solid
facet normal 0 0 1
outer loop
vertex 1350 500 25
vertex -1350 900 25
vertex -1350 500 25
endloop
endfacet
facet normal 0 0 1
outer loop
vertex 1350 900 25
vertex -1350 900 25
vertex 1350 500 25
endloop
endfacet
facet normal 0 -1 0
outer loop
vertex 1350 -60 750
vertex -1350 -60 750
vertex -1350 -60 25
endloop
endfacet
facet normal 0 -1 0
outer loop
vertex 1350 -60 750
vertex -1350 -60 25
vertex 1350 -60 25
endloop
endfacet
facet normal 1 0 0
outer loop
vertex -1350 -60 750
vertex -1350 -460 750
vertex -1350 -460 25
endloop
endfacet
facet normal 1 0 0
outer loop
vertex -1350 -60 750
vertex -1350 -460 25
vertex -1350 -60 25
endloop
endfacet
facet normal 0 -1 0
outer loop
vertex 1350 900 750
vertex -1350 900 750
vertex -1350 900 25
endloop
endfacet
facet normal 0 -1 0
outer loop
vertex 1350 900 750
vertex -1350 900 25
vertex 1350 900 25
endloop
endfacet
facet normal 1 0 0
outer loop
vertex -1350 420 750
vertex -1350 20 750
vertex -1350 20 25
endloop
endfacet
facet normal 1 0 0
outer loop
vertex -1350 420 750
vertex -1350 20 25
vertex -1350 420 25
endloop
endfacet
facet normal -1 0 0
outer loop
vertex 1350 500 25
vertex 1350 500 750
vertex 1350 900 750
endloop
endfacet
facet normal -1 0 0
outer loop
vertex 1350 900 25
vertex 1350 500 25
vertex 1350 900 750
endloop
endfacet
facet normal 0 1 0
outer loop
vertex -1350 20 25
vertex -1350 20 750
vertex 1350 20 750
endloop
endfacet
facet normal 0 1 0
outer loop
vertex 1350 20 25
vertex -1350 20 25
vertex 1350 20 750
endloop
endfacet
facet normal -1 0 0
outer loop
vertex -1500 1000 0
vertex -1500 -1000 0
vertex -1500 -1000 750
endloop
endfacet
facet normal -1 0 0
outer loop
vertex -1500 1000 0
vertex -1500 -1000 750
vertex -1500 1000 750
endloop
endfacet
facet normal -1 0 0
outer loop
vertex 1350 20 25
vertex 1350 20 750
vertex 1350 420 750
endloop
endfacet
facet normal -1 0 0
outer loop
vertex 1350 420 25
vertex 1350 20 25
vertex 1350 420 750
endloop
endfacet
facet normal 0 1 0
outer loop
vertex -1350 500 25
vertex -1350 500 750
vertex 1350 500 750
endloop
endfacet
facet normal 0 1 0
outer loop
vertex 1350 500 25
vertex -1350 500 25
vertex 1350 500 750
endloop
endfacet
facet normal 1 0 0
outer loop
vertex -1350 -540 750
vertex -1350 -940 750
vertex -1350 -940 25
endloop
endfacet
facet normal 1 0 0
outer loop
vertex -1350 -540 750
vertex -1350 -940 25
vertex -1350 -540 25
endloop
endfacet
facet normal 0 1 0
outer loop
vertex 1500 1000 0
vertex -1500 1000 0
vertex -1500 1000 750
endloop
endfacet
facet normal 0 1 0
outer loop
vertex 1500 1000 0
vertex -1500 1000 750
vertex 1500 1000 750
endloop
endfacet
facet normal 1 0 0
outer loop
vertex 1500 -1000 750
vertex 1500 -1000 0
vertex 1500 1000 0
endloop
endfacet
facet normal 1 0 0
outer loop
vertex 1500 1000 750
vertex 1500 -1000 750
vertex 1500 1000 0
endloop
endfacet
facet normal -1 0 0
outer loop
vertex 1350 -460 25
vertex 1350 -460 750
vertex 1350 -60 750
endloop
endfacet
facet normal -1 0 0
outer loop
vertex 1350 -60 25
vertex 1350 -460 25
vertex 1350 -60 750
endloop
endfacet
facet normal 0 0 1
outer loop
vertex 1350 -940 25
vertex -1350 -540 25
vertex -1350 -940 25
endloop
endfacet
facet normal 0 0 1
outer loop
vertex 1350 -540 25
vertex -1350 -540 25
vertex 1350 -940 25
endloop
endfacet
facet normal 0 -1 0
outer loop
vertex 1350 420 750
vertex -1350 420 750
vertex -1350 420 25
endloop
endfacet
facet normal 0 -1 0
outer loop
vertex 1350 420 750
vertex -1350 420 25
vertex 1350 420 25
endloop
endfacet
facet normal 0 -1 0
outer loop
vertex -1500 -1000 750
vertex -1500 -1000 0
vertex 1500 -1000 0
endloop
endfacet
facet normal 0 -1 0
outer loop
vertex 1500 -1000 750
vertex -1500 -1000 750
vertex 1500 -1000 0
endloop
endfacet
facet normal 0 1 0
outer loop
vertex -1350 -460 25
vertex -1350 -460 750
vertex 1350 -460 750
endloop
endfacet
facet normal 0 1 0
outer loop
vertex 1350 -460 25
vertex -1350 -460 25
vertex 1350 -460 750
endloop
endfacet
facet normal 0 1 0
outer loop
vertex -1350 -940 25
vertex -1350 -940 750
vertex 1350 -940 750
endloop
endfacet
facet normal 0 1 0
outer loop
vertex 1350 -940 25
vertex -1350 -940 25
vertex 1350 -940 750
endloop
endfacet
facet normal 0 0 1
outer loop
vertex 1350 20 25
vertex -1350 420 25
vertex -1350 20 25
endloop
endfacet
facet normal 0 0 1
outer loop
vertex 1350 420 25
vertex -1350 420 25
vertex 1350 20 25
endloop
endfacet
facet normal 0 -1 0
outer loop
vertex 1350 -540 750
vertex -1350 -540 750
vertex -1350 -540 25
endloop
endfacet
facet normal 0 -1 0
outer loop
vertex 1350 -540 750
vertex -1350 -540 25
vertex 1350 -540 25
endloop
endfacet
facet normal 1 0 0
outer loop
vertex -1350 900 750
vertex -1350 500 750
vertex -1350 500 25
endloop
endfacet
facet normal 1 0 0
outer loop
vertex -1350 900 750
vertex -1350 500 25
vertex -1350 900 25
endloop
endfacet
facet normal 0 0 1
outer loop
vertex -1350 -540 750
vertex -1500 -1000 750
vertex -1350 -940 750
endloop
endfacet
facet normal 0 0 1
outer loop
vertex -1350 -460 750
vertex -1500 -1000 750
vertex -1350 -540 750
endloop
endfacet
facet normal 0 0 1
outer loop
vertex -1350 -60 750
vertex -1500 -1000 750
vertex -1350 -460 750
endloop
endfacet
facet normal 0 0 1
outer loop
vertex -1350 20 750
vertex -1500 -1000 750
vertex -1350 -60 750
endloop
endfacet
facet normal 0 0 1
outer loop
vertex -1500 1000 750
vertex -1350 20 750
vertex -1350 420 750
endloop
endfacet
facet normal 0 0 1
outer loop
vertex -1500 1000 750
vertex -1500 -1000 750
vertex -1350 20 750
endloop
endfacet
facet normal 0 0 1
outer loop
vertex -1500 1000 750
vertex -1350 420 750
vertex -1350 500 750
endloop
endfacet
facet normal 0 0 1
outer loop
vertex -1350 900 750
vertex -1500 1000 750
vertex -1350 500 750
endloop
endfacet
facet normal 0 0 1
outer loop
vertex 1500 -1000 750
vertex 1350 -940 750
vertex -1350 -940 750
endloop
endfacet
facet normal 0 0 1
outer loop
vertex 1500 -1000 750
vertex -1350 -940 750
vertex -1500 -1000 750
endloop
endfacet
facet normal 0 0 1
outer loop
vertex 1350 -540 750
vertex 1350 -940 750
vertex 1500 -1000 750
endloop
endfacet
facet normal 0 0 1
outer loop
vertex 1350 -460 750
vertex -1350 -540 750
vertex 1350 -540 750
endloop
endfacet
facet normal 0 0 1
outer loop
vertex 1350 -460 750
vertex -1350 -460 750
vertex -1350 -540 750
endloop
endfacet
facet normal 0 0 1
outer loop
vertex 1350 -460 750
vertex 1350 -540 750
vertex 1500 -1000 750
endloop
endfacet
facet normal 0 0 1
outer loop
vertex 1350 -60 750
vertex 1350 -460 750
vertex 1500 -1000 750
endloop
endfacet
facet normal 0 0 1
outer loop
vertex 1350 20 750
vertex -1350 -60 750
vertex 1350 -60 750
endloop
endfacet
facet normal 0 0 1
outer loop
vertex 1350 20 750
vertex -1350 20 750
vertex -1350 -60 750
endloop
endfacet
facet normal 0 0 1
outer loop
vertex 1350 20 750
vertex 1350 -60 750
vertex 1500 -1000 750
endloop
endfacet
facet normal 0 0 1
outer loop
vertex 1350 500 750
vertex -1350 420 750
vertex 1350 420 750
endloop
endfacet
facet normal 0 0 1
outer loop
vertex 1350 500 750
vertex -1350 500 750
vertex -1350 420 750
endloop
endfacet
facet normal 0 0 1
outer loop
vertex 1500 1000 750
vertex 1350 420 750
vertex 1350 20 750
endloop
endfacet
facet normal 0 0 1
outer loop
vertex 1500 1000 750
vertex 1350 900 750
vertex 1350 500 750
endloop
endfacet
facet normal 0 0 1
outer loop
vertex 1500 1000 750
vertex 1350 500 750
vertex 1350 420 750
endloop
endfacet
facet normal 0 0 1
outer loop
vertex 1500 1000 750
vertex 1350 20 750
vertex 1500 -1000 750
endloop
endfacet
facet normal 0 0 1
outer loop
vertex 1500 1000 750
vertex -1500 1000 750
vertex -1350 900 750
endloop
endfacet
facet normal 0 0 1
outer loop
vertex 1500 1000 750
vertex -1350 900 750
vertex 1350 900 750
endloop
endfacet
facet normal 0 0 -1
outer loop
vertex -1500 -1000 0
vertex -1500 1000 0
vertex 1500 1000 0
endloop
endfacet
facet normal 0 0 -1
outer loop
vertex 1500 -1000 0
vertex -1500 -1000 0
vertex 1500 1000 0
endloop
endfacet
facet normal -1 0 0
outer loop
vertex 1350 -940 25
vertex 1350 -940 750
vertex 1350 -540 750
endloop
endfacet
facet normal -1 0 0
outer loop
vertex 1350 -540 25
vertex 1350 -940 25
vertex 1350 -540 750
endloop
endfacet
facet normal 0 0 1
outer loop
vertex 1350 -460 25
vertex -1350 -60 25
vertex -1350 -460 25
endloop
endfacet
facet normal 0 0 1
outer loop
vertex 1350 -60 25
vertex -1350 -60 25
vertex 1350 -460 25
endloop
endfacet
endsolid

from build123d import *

# Parameters (mm, degrees)
SKETCH1_W           = 3000
SKETCH1_H           = 2000
BOSS_EXTRUDE1_DEPTH = 750
SKETCH2_W           = 2700
SKETCH2_H           = 400
CUT_EXTRUDE1_DEPTH  = 725
LPATTERN1_COUNT     = 4
LPATTERN1_PITCH     = 480


with BuildPart() as part:
    # Sketch1 → Boss-Extrude1 (new body)
    with BuildSketch(Plane.XY):
        Rectangle(SKETCH1_W, SKETCH1_H)
    extrude(amount=BOSS_EXTRUDE1_DEPTH)

    # Sketch2 → Cut-Extrude1 (cut)
    with BuildSketch(Plane.XY.offset(750)):
        with Locations((0, 700)):
            Rectangle(SKETCH2_W, SKETCH2_H)
    cut_extrude1 = extrude(amount=-CUT_EXTRUDE1_DEPTH, mode=Mode.SUBTRACT)

    # LPattern1: Cut-Extrude1 ×4
    with Locations(*[(0, -i * LPATTERN1_PITCH, 0) for i in range(1, LPATTERN1_COUNT)]):
        add(cut_extrude1, mode=Mode.SUBTRACT)


solid = part.part
